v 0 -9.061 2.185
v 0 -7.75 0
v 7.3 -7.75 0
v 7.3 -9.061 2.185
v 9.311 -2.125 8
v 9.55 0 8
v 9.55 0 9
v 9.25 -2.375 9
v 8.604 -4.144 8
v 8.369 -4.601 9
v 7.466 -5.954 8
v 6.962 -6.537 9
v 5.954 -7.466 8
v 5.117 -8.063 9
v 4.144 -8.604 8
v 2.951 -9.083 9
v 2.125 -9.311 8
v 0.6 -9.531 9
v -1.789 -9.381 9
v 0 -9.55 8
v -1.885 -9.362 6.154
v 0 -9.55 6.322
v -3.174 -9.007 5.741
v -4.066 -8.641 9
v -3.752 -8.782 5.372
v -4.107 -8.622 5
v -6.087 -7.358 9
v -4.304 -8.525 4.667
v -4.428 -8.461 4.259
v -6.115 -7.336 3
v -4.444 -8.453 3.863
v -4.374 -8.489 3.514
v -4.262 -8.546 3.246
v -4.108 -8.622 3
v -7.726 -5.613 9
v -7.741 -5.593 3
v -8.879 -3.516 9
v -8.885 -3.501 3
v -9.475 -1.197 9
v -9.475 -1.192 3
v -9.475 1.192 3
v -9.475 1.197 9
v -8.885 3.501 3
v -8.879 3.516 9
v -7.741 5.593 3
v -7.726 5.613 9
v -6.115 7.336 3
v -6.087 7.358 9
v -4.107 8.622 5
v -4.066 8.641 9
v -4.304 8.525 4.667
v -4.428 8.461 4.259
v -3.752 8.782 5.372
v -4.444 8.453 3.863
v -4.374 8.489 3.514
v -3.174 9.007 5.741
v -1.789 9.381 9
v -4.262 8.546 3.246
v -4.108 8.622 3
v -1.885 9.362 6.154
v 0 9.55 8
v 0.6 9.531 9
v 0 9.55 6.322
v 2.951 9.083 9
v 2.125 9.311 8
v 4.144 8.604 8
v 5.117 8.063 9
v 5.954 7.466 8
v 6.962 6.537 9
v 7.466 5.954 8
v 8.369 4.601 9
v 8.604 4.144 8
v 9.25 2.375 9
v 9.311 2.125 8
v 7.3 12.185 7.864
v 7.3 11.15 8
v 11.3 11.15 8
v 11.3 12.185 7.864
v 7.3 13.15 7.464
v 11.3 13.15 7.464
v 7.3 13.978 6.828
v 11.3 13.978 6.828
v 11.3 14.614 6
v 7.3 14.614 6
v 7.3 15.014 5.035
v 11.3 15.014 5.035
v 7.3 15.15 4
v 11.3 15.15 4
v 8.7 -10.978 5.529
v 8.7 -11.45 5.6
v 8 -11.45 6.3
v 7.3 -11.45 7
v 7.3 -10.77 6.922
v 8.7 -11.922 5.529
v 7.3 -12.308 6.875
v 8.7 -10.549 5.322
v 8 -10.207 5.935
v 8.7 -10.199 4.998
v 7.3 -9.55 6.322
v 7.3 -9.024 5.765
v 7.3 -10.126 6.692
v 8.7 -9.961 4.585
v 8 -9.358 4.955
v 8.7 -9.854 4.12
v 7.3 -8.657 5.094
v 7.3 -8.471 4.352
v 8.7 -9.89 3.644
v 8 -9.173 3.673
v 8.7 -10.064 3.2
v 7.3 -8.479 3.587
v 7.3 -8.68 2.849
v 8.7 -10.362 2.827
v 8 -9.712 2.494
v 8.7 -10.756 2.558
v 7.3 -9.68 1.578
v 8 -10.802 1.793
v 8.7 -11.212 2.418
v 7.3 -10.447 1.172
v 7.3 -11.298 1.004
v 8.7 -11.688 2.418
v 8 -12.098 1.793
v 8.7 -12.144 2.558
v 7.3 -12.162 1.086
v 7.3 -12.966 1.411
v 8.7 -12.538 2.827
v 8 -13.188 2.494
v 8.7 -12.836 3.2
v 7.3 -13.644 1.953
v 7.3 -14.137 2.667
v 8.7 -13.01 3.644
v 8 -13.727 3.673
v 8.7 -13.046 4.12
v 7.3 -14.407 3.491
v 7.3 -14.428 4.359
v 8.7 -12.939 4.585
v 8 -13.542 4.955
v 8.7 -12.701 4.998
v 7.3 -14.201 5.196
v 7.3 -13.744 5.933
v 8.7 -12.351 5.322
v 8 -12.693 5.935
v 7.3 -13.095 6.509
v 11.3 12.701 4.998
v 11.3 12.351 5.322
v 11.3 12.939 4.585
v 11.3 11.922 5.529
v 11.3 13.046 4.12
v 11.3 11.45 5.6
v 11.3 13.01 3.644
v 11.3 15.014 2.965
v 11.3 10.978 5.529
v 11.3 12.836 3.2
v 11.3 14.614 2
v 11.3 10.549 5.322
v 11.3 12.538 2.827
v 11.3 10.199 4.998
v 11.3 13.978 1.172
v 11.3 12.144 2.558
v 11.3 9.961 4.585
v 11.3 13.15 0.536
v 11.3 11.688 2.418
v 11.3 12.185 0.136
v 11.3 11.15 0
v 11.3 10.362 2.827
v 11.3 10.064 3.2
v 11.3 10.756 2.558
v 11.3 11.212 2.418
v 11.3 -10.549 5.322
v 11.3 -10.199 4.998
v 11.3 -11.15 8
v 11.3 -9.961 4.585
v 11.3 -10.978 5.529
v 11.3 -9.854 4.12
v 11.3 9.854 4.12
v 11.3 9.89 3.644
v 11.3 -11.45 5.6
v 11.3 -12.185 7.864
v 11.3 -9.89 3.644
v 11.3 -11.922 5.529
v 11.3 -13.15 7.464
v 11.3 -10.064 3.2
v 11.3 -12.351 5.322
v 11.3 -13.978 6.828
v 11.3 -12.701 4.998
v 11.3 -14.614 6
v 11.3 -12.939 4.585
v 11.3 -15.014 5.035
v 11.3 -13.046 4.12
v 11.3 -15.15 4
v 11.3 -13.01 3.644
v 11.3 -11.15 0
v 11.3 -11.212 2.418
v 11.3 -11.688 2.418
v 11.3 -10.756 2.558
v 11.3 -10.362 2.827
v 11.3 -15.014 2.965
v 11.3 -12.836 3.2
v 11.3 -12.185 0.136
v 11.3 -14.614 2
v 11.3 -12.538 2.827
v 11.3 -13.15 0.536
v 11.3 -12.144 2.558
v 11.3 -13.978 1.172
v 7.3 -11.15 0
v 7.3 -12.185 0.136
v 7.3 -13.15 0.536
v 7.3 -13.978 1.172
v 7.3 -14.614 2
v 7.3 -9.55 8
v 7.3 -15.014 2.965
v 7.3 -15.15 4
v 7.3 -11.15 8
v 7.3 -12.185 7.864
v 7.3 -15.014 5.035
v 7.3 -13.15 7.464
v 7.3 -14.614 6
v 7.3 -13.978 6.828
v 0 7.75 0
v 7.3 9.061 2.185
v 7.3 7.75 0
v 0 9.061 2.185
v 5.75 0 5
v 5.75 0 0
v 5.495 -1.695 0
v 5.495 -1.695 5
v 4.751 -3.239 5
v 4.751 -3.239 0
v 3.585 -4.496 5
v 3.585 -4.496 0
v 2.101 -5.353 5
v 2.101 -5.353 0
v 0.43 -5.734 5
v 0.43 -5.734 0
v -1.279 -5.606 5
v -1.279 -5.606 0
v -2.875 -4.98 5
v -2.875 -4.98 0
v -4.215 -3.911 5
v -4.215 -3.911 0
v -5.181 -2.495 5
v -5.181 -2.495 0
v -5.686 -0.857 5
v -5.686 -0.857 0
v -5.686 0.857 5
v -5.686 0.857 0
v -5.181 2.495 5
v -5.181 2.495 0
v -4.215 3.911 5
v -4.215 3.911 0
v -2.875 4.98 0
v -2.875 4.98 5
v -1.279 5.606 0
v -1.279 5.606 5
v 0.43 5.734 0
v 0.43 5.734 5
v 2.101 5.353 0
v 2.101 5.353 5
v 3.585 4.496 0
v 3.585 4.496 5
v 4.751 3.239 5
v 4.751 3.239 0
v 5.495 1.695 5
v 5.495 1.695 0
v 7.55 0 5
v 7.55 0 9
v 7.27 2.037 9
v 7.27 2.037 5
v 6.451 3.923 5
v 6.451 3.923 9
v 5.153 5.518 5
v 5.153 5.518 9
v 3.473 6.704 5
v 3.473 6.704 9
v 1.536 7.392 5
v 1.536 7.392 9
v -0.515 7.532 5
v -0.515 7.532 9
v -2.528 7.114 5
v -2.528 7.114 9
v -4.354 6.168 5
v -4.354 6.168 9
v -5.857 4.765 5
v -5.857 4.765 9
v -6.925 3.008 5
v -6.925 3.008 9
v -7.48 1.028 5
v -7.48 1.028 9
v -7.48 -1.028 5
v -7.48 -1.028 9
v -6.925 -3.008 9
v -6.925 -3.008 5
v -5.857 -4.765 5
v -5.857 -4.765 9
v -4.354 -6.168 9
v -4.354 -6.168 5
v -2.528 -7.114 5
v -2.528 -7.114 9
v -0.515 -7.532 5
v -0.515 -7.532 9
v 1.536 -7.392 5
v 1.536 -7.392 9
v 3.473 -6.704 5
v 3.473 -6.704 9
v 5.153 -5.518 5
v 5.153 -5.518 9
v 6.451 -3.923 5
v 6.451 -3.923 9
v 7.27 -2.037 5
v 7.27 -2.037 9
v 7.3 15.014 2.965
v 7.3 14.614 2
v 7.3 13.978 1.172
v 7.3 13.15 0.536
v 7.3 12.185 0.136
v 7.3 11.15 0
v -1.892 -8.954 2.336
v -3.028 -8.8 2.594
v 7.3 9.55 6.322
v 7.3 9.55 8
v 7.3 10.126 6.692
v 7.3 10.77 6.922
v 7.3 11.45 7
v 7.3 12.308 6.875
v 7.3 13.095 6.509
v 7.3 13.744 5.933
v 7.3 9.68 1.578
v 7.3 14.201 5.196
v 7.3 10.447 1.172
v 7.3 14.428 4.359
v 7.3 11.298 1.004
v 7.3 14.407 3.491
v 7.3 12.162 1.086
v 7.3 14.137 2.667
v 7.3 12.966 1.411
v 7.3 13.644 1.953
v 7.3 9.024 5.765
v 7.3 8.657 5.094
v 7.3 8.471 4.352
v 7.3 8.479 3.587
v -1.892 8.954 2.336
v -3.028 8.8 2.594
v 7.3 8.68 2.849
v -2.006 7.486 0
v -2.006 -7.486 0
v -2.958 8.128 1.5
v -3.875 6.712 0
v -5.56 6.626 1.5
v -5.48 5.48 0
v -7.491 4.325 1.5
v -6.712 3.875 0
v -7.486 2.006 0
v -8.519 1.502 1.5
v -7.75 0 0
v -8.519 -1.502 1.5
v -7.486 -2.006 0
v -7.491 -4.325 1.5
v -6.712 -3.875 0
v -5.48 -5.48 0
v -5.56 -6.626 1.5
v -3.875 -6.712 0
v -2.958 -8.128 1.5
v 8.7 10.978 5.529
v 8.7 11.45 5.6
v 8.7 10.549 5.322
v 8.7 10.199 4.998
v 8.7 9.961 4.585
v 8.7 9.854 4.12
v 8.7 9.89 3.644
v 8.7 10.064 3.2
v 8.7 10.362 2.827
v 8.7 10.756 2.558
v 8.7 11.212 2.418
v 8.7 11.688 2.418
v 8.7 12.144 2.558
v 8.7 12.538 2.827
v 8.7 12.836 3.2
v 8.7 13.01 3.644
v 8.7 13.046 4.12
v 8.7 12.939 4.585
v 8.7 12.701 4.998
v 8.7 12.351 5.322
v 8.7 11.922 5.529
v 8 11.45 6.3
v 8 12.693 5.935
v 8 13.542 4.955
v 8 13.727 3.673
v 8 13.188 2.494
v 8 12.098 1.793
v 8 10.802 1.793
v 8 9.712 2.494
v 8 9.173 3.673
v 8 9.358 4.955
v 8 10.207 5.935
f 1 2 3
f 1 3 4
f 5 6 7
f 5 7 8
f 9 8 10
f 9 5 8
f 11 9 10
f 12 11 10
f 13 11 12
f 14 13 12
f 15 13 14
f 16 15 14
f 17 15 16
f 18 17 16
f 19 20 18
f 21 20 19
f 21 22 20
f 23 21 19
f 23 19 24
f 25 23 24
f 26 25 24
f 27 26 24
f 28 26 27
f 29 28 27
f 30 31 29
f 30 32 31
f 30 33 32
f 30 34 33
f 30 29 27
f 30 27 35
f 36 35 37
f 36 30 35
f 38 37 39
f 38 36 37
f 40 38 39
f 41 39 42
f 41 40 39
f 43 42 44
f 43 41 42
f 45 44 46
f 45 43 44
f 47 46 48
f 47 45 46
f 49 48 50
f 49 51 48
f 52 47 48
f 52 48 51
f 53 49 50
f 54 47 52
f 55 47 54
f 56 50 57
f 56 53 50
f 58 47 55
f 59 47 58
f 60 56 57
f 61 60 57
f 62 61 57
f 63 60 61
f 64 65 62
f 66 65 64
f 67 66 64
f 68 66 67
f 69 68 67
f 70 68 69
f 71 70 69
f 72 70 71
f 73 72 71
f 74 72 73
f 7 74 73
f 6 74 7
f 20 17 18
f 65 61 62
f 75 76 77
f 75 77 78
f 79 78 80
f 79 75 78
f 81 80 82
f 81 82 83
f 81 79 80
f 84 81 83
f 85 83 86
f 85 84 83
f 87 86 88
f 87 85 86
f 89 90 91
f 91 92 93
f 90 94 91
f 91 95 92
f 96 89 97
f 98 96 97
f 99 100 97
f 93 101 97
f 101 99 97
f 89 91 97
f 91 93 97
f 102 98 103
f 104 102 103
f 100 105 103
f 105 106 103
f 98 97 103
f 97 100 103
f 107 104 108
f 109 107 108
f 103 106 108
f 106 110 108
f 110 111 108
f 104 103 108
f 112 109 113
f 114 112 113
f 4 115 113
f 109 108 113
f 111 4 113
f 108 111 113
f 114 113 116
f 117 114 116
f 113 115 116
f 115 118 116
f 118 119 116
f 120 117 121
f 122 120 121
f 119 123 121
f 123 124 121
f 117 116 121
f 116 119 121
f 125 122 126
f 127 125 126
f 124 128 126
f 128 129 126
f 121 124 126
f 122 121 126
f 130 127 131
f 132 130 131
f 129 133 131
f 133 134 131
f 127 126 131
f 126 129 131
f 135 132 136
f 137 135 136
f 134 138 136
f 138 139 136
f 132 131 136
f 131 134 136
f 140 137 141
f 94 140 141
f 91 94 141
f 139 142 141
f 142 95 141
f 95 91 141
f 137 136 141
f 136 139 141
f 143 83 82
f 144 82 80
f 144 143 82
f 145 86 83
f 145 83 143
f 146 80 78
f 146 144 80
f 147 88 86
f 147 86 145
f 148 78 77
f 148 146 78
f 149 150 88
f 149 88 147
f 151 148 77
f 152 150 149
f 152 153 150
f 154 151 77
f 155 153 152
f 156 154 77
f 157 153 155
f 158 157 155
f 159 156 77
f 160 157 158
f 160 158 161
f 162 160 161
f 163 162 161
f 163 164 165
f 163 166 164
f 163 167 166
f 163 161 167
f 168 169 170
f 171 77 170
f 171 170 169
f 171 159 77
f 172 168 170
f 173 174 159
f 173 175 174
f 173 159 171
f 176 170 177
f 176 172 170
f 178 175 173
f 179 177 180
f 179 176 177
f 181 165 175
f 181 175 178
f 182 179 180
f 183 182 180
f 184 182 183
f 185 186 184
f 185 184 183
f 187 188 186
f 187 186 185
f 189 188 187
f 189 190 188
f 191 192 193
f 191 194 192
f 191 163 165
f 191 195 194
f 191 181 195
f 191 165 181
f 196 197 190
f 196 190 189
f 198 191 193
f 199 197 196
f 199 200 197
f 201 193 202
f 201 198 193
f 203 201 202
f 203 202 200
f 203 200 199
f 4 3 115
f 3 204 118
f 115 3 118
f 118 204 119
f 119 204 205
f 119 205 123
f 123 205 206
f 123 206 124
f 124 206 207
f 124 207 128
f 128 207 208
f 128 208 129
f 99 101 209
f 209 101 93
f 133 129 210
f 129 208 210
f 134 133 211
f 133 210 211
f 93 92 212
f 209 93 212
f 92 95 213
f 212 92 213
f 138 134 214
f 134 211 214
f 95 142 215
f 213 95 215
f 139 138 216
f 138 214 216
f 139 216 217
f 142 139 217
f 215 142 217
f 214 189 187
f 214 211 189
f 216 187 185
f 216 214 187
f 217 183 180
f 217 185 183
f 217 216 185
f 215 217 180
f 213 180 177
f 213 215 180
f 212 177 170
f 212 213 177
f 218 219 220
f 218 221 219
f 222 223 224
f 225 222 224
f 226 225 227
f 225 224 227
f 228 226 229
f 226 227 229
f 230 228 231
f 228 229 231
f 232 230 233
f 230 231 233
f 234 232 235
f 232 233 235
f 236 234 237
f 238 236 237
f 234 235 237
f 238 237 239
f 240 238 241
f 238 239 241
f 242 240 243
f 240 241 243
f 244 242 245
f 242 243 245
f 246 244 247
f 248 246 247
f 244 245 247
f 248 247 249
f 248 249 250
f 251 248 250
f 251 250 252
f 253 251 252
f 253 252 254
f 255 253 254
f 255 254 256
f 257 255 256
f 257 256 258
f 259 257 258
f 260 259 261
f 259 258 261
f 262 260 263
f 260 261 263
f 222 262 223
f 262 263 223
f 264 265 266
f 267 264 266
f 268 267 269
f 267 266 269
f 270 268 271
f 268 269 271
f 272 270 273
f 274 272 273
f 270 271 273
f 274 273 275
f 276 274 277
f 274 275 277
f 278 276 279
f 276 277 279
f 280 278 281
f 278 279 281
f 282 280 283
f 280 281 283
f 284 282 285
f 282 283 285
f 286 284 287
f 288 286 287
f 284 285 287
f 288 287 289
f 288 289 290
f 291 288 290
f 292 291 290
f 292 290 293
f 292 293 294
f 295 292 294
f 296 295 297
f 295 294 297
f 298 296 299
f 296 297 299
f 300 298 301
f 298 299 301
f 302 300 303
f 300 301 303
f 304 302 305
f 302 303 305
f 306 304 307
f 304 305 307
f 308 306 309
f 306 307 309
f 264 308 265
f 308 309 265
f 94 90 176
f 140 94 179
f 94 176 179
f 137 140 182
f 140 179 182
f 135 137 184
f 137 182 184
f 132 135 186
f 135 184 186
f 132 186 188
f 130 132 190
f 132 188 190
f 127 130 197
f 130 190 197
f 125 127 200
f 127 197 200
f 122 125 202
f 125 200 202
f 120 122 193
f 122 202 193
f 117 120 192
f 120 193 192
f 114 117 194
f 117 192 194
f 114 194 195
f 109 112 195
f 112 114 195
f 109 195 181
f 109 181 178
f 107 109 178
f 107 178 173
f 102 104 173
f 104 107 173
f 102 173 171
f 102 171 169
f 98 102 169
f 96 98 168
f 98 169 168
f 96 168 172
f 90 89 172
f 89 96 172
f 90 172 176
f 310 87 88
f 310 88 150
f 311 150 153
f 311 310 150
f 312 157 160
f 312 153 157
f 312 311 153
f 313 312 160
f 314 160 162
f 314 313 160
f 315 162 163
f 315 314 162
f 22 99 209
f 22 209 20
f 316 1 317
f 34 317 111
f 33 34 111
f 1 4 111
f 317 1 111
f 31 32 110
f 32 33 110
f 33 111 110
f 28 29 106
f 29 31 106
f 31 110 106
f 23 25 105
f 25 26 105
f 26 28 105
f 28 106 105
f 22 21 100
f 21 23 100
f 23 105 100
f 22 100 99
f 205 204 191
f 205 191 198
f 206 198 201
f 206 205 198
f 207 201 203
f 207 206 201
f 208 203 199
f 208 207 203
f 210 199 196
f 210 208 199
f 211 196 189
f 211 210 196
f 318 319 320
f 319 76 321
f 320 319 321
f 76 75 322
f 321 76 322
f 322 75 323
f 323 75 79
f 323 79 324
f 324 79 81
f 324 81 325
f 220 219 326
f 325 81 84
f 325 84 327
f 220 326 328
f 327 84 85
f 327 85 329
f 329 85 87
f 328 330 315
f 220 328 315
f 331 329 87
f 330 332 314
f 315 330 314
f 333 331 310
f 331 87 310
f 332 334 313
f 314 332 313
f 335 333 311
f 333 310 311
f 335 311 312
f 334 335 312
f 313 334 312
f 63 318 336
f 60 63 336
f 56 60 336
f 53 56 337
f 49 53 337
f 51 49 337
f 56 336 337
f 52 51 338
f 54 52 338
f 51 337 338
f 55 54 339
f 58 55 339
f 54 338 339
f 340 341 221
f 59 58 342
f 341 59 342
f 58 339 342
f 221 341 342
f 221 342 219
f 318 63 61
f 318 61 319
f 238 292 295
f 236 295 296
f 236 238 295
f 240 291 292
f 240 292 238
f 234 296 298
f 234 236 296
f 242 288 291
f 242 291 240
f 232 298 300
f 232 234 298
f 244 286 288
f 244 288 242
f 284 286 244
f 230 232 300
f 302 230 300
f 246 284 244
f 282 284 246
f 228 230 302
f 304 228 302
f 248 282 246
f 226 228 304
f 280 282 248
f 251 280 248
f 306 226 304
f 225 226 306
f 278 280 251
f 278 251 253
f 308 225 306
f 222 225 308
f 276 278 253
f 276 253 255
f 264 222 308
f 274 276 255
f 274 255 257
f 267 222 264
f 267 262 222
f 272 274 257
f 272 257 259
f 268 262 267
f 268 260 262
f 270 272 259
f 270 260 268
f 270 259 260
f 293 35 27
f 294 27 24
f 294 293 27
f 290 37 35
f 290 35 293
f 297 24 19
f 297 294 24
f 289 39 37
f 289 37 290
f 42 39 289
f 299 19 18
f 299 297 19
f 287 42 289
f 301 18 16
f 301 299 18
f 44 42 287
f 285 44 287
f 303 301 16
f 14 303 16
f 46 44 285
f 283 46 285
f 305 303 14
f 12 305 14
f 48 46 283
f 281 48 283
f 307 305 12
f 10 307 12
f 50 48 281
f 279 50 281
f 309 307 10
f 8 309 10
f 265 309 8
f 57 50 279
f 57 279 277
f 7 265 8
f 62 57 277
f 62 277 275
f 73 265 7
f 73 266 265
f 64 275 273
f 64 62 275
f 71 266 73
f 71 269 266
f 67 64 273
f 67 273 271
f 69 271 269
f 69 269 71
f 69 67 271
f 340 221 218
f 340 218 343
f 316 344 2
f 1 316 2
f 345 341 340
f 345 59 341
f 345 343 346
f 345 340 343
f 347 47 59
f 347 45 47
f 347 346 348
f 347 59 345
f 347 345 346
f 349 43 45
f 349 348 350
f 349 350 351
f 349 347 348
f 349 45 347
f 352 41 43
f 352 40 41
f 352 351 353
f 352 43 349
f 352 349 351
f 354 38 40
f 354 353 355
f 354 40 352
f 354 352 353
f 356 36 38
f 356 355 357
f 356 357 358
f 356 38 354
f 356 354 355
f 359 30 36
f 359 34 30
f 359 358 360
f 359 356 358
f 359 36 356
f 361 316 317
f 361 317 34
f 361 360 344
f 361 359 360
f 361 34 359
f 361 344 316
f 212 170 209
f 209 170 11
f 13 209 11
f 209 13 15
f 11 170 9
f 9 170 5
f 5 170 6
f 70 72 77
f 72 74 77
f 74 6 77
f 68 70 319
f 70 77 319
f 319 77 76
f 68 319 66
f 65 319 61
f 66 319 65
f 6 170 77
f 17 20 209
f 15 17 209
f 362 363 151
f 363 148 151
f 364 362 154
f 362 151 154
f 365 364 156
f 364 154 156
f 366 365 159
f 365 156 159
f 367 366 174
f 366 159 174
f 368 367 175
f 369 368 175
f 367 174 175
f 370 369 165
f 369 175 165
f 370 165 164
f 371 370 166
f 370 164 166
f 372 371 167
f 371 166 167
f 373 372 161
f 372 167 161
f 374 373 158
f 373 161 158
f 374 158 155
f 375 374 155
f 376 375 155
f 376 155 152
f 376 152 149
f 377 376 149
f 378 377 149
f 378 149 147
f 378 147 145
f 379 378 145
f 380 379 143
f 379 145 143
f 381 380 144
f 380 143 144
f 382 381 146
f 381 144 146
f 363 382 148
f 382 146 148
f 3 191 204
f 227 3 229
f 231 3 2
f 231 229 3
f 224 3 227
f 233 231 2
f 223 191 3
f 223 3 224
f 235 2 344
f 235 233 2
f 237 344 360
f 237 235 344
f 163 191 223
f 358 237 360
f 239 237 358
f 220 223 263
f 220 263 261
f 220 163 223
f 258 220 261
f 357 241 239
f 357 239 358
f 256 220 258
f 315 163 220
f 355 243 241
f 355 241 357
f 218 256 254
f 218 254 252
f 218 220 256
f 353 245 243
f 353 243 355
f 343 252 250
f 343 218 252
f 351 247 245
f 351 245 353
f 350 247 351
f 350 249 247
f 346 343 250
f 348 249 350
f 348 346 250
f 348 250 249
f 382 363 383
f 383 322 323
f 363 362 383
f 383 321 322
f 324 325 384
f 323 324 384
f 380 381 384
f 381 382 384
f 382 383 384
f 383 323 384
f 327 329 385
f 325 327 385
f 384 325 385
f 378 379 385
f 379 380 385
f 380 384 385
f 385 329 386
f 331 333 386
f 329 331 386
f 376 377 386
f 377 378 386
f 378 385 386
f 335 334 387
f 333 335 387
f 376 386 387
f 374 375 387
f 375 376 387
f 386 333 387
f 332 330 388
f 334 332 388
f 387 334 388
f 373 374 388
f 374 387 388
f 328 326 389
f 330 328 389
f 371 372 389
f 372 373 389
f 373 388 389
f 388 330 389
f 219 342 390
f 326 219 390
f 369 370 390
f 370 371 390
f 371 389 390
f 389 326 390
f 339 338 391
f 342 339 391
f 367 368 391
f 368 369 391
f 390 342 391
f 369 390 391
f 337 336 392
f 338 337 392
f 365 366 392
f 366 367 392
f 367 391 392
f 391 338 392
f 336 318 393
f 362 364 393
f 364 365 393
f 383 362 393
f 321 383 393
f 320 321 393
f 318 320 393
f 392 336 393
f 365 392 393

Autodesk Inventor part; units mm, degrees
ref_plane "YZ Plane" through (0, 0, 0) normal (1, 0, 0) x (0, 1, 0)
ref_plane "XZ Plane" through (0, 0, 0) normal (0, 1, 0) x (-1, 0, 0)
sketch "Эскиз1" plane through (0, 0, 0) normal (0, 0, 1) x (1, 0, 0)
  circle A0 centre (0, 0) radius 5.75
  circle A1 centre (0, 0) radius 9.55
  dimension "d0" = 11.5
  dimension "d1" = 19.1
extrude "Выдавливание1" add sketch "Эскиз1" along normal blind 9
sketch "Эскиз2" plane through (0, 0, 9) normal (0, 0, 1) x (1, 0, 0)
  circle A0 centre (0, 0) radius 7.55
  dimension "d4" = 15.1
extrude "Выдавливание2" cut sketch "Эскиз2" against normal blind 4
chamfer "Фаска1" distance 3 distance2 1.8 1 edges at (-9.55, 0, 0) measured on face at (9.519, -0.7685, 6)
sketch "Эскиз3" plane through (0, 0, 0) normal (0, 0, -1) x (-1, 0, 0)
  circle A0 centre (0, 0) radius 5.75 projected
  circle A1 centre (0, 0) radius 7.75 projected
  circle A2 centre (0, 0) radius 9.55 projected
  line L0 (0, 9.55) -> (-11.3, 9.55)
  line L1 (-11.3, 9.55) -> (-11.3, -9.55)
  line L2 (-11.3, -9.55) -> (0, -9.55)
  line L3 (0, -9.55) -> (0, 9.55)
  point P0 (0, -7.75)
  point P1 (0, 7.75)
  dimension "d10" = 11.3
extrude "Выдавливание3" add sketch "Эскиз3" against normal blind 8 contours A1 L3 A2 | A2 L2 L1 L0 picked at (-0.7618, -8.8575)
sketch "Эскиз4" plane through (0, 7.75, 0) normal (-1, 0, 0) x (0, 0, 1)
  line L0 (3, 1.8) -> (0, 0) projected
  line L1 (0, 1.8) -> (3, 1.8) projected
  line L2 (0, 0) -> (0, 1.8) projected
  line L3 (0, -17.3) -> (3, -17.3) projected
  line L4 (0, -15.5) -> (3, -17.3) projected
  line L5 (0, -17.3) -> (0, -15.5) projected
  line L6 (0, -17.3) -> (3, -17.3) projected
  point P0 (0, -7.75)
extrude "Выдавливание4" cut sketch "Эскиз4" against normal through all
sketch "Эскиз5" plane through (11.3, -9.55, 8) normal (1, 0, 0) x (0, 0, -1)
  line L0 (0, 19.1) -> (0, 0) projected
  line L1 (0, 19.1) -> (8, 19.1)
  line L2 (8, 19.1) -> (8, 24.7)
  line L3 (8, 24.7) -> (0, 24.7)
  line L4 (0, 24.7) -> (0, 19.1)
  line L5 (8, 19.1) -> (5, 19.1)
  line L6 (5, 19.1) -> (5, 16.7)
  line L7 (5, 16.7) -> (8, 16.7)
  line L8 (8, 16.7) -> (8, 19.1)
  line L9 (5, 0) -> (5, 19.1) projected
  point P0 (8, 9.55)
  dimension "d15" = 8
  dimension "d16" = 5.6
  dimension "d26" = 8
extrude "Выдавливание5" add sketch "Эскиз5" against normal blind 4
sketch "Эскиз6" plane through (7.3, -9.55, 8) normal (-1, 0, 0) x (0, 0, 1)
  line L0 (-5, 19.1) -> (-8, 17.3) projected
  line L1 (0, 19.1) -> (-5, 19.1) projected
  line L2 (0, 19.1) -> (0, 24.7) projected
  line L3 (0, 24.7) -> (-8, 24.7) projected
  line L4 (-8, 24.7) -> (-8, 17.3) projected
  line L5 (-8, 24.7) -> (-8, 17.3) projected
  line L6 (-8, 21) -> (0, 21)
  line L7 (0, 19.1) -> (0, 24.7) projected
  point P0 (-8, 9.55)
  point P1 (-4, 21)
hole "Отверстие1" at (7.3, 11.45, 4) direction (1, 0, 0) diameter 3.2 end through all countersink diameter 6 countersink angle 90
sketch "Эскиз8" plane through (7.3, -9.55, 8) normal (-1, 0, 0) x (0, 0, 1)
  arc A0 (-1.6784, 19.1) -> (-5.8148, 18.6111) centre (-4, 21) ccw projected
  circle A1 centre (-4, 21) radius 1.6 projected
  arc A2 (-1.6784, 19.1) -> (-5.8148, 18.6111) centre (-4, 21) ccw projected
  arc A3 (-5.8148, 18.6111) -> (-1.6784, 19.1) centre (-4, 21) ccw projected
  circle A4 centre (-4, 21) radius 1.6 projected
  point P0 (-8, 9.55)
  point P1 (-5.8148, 18.6111)
  point P2 (-1.6784, 19.1)
extrude "Выдавливание6" cut sketch "Эскиз8" along normal through all contours A3 A0 | A1
fillet "Сопряжение1" radius 4 2 edges at (9.3, 15.15, 0) (9.3, 15.15, 8)
ref_plane "РабПлоскость1" through (0, 0, 8) normal (0, 1, 0) x (1, 0, 0)
mirror "Зеркальное отражение1" about plane through (0, 0, 8) normal (0, 1, 0) of "Сопряжение1", "Отверстие1", "Выдавливание6", "Выдавливание5"
properties part number "Крепление дифференциала"
